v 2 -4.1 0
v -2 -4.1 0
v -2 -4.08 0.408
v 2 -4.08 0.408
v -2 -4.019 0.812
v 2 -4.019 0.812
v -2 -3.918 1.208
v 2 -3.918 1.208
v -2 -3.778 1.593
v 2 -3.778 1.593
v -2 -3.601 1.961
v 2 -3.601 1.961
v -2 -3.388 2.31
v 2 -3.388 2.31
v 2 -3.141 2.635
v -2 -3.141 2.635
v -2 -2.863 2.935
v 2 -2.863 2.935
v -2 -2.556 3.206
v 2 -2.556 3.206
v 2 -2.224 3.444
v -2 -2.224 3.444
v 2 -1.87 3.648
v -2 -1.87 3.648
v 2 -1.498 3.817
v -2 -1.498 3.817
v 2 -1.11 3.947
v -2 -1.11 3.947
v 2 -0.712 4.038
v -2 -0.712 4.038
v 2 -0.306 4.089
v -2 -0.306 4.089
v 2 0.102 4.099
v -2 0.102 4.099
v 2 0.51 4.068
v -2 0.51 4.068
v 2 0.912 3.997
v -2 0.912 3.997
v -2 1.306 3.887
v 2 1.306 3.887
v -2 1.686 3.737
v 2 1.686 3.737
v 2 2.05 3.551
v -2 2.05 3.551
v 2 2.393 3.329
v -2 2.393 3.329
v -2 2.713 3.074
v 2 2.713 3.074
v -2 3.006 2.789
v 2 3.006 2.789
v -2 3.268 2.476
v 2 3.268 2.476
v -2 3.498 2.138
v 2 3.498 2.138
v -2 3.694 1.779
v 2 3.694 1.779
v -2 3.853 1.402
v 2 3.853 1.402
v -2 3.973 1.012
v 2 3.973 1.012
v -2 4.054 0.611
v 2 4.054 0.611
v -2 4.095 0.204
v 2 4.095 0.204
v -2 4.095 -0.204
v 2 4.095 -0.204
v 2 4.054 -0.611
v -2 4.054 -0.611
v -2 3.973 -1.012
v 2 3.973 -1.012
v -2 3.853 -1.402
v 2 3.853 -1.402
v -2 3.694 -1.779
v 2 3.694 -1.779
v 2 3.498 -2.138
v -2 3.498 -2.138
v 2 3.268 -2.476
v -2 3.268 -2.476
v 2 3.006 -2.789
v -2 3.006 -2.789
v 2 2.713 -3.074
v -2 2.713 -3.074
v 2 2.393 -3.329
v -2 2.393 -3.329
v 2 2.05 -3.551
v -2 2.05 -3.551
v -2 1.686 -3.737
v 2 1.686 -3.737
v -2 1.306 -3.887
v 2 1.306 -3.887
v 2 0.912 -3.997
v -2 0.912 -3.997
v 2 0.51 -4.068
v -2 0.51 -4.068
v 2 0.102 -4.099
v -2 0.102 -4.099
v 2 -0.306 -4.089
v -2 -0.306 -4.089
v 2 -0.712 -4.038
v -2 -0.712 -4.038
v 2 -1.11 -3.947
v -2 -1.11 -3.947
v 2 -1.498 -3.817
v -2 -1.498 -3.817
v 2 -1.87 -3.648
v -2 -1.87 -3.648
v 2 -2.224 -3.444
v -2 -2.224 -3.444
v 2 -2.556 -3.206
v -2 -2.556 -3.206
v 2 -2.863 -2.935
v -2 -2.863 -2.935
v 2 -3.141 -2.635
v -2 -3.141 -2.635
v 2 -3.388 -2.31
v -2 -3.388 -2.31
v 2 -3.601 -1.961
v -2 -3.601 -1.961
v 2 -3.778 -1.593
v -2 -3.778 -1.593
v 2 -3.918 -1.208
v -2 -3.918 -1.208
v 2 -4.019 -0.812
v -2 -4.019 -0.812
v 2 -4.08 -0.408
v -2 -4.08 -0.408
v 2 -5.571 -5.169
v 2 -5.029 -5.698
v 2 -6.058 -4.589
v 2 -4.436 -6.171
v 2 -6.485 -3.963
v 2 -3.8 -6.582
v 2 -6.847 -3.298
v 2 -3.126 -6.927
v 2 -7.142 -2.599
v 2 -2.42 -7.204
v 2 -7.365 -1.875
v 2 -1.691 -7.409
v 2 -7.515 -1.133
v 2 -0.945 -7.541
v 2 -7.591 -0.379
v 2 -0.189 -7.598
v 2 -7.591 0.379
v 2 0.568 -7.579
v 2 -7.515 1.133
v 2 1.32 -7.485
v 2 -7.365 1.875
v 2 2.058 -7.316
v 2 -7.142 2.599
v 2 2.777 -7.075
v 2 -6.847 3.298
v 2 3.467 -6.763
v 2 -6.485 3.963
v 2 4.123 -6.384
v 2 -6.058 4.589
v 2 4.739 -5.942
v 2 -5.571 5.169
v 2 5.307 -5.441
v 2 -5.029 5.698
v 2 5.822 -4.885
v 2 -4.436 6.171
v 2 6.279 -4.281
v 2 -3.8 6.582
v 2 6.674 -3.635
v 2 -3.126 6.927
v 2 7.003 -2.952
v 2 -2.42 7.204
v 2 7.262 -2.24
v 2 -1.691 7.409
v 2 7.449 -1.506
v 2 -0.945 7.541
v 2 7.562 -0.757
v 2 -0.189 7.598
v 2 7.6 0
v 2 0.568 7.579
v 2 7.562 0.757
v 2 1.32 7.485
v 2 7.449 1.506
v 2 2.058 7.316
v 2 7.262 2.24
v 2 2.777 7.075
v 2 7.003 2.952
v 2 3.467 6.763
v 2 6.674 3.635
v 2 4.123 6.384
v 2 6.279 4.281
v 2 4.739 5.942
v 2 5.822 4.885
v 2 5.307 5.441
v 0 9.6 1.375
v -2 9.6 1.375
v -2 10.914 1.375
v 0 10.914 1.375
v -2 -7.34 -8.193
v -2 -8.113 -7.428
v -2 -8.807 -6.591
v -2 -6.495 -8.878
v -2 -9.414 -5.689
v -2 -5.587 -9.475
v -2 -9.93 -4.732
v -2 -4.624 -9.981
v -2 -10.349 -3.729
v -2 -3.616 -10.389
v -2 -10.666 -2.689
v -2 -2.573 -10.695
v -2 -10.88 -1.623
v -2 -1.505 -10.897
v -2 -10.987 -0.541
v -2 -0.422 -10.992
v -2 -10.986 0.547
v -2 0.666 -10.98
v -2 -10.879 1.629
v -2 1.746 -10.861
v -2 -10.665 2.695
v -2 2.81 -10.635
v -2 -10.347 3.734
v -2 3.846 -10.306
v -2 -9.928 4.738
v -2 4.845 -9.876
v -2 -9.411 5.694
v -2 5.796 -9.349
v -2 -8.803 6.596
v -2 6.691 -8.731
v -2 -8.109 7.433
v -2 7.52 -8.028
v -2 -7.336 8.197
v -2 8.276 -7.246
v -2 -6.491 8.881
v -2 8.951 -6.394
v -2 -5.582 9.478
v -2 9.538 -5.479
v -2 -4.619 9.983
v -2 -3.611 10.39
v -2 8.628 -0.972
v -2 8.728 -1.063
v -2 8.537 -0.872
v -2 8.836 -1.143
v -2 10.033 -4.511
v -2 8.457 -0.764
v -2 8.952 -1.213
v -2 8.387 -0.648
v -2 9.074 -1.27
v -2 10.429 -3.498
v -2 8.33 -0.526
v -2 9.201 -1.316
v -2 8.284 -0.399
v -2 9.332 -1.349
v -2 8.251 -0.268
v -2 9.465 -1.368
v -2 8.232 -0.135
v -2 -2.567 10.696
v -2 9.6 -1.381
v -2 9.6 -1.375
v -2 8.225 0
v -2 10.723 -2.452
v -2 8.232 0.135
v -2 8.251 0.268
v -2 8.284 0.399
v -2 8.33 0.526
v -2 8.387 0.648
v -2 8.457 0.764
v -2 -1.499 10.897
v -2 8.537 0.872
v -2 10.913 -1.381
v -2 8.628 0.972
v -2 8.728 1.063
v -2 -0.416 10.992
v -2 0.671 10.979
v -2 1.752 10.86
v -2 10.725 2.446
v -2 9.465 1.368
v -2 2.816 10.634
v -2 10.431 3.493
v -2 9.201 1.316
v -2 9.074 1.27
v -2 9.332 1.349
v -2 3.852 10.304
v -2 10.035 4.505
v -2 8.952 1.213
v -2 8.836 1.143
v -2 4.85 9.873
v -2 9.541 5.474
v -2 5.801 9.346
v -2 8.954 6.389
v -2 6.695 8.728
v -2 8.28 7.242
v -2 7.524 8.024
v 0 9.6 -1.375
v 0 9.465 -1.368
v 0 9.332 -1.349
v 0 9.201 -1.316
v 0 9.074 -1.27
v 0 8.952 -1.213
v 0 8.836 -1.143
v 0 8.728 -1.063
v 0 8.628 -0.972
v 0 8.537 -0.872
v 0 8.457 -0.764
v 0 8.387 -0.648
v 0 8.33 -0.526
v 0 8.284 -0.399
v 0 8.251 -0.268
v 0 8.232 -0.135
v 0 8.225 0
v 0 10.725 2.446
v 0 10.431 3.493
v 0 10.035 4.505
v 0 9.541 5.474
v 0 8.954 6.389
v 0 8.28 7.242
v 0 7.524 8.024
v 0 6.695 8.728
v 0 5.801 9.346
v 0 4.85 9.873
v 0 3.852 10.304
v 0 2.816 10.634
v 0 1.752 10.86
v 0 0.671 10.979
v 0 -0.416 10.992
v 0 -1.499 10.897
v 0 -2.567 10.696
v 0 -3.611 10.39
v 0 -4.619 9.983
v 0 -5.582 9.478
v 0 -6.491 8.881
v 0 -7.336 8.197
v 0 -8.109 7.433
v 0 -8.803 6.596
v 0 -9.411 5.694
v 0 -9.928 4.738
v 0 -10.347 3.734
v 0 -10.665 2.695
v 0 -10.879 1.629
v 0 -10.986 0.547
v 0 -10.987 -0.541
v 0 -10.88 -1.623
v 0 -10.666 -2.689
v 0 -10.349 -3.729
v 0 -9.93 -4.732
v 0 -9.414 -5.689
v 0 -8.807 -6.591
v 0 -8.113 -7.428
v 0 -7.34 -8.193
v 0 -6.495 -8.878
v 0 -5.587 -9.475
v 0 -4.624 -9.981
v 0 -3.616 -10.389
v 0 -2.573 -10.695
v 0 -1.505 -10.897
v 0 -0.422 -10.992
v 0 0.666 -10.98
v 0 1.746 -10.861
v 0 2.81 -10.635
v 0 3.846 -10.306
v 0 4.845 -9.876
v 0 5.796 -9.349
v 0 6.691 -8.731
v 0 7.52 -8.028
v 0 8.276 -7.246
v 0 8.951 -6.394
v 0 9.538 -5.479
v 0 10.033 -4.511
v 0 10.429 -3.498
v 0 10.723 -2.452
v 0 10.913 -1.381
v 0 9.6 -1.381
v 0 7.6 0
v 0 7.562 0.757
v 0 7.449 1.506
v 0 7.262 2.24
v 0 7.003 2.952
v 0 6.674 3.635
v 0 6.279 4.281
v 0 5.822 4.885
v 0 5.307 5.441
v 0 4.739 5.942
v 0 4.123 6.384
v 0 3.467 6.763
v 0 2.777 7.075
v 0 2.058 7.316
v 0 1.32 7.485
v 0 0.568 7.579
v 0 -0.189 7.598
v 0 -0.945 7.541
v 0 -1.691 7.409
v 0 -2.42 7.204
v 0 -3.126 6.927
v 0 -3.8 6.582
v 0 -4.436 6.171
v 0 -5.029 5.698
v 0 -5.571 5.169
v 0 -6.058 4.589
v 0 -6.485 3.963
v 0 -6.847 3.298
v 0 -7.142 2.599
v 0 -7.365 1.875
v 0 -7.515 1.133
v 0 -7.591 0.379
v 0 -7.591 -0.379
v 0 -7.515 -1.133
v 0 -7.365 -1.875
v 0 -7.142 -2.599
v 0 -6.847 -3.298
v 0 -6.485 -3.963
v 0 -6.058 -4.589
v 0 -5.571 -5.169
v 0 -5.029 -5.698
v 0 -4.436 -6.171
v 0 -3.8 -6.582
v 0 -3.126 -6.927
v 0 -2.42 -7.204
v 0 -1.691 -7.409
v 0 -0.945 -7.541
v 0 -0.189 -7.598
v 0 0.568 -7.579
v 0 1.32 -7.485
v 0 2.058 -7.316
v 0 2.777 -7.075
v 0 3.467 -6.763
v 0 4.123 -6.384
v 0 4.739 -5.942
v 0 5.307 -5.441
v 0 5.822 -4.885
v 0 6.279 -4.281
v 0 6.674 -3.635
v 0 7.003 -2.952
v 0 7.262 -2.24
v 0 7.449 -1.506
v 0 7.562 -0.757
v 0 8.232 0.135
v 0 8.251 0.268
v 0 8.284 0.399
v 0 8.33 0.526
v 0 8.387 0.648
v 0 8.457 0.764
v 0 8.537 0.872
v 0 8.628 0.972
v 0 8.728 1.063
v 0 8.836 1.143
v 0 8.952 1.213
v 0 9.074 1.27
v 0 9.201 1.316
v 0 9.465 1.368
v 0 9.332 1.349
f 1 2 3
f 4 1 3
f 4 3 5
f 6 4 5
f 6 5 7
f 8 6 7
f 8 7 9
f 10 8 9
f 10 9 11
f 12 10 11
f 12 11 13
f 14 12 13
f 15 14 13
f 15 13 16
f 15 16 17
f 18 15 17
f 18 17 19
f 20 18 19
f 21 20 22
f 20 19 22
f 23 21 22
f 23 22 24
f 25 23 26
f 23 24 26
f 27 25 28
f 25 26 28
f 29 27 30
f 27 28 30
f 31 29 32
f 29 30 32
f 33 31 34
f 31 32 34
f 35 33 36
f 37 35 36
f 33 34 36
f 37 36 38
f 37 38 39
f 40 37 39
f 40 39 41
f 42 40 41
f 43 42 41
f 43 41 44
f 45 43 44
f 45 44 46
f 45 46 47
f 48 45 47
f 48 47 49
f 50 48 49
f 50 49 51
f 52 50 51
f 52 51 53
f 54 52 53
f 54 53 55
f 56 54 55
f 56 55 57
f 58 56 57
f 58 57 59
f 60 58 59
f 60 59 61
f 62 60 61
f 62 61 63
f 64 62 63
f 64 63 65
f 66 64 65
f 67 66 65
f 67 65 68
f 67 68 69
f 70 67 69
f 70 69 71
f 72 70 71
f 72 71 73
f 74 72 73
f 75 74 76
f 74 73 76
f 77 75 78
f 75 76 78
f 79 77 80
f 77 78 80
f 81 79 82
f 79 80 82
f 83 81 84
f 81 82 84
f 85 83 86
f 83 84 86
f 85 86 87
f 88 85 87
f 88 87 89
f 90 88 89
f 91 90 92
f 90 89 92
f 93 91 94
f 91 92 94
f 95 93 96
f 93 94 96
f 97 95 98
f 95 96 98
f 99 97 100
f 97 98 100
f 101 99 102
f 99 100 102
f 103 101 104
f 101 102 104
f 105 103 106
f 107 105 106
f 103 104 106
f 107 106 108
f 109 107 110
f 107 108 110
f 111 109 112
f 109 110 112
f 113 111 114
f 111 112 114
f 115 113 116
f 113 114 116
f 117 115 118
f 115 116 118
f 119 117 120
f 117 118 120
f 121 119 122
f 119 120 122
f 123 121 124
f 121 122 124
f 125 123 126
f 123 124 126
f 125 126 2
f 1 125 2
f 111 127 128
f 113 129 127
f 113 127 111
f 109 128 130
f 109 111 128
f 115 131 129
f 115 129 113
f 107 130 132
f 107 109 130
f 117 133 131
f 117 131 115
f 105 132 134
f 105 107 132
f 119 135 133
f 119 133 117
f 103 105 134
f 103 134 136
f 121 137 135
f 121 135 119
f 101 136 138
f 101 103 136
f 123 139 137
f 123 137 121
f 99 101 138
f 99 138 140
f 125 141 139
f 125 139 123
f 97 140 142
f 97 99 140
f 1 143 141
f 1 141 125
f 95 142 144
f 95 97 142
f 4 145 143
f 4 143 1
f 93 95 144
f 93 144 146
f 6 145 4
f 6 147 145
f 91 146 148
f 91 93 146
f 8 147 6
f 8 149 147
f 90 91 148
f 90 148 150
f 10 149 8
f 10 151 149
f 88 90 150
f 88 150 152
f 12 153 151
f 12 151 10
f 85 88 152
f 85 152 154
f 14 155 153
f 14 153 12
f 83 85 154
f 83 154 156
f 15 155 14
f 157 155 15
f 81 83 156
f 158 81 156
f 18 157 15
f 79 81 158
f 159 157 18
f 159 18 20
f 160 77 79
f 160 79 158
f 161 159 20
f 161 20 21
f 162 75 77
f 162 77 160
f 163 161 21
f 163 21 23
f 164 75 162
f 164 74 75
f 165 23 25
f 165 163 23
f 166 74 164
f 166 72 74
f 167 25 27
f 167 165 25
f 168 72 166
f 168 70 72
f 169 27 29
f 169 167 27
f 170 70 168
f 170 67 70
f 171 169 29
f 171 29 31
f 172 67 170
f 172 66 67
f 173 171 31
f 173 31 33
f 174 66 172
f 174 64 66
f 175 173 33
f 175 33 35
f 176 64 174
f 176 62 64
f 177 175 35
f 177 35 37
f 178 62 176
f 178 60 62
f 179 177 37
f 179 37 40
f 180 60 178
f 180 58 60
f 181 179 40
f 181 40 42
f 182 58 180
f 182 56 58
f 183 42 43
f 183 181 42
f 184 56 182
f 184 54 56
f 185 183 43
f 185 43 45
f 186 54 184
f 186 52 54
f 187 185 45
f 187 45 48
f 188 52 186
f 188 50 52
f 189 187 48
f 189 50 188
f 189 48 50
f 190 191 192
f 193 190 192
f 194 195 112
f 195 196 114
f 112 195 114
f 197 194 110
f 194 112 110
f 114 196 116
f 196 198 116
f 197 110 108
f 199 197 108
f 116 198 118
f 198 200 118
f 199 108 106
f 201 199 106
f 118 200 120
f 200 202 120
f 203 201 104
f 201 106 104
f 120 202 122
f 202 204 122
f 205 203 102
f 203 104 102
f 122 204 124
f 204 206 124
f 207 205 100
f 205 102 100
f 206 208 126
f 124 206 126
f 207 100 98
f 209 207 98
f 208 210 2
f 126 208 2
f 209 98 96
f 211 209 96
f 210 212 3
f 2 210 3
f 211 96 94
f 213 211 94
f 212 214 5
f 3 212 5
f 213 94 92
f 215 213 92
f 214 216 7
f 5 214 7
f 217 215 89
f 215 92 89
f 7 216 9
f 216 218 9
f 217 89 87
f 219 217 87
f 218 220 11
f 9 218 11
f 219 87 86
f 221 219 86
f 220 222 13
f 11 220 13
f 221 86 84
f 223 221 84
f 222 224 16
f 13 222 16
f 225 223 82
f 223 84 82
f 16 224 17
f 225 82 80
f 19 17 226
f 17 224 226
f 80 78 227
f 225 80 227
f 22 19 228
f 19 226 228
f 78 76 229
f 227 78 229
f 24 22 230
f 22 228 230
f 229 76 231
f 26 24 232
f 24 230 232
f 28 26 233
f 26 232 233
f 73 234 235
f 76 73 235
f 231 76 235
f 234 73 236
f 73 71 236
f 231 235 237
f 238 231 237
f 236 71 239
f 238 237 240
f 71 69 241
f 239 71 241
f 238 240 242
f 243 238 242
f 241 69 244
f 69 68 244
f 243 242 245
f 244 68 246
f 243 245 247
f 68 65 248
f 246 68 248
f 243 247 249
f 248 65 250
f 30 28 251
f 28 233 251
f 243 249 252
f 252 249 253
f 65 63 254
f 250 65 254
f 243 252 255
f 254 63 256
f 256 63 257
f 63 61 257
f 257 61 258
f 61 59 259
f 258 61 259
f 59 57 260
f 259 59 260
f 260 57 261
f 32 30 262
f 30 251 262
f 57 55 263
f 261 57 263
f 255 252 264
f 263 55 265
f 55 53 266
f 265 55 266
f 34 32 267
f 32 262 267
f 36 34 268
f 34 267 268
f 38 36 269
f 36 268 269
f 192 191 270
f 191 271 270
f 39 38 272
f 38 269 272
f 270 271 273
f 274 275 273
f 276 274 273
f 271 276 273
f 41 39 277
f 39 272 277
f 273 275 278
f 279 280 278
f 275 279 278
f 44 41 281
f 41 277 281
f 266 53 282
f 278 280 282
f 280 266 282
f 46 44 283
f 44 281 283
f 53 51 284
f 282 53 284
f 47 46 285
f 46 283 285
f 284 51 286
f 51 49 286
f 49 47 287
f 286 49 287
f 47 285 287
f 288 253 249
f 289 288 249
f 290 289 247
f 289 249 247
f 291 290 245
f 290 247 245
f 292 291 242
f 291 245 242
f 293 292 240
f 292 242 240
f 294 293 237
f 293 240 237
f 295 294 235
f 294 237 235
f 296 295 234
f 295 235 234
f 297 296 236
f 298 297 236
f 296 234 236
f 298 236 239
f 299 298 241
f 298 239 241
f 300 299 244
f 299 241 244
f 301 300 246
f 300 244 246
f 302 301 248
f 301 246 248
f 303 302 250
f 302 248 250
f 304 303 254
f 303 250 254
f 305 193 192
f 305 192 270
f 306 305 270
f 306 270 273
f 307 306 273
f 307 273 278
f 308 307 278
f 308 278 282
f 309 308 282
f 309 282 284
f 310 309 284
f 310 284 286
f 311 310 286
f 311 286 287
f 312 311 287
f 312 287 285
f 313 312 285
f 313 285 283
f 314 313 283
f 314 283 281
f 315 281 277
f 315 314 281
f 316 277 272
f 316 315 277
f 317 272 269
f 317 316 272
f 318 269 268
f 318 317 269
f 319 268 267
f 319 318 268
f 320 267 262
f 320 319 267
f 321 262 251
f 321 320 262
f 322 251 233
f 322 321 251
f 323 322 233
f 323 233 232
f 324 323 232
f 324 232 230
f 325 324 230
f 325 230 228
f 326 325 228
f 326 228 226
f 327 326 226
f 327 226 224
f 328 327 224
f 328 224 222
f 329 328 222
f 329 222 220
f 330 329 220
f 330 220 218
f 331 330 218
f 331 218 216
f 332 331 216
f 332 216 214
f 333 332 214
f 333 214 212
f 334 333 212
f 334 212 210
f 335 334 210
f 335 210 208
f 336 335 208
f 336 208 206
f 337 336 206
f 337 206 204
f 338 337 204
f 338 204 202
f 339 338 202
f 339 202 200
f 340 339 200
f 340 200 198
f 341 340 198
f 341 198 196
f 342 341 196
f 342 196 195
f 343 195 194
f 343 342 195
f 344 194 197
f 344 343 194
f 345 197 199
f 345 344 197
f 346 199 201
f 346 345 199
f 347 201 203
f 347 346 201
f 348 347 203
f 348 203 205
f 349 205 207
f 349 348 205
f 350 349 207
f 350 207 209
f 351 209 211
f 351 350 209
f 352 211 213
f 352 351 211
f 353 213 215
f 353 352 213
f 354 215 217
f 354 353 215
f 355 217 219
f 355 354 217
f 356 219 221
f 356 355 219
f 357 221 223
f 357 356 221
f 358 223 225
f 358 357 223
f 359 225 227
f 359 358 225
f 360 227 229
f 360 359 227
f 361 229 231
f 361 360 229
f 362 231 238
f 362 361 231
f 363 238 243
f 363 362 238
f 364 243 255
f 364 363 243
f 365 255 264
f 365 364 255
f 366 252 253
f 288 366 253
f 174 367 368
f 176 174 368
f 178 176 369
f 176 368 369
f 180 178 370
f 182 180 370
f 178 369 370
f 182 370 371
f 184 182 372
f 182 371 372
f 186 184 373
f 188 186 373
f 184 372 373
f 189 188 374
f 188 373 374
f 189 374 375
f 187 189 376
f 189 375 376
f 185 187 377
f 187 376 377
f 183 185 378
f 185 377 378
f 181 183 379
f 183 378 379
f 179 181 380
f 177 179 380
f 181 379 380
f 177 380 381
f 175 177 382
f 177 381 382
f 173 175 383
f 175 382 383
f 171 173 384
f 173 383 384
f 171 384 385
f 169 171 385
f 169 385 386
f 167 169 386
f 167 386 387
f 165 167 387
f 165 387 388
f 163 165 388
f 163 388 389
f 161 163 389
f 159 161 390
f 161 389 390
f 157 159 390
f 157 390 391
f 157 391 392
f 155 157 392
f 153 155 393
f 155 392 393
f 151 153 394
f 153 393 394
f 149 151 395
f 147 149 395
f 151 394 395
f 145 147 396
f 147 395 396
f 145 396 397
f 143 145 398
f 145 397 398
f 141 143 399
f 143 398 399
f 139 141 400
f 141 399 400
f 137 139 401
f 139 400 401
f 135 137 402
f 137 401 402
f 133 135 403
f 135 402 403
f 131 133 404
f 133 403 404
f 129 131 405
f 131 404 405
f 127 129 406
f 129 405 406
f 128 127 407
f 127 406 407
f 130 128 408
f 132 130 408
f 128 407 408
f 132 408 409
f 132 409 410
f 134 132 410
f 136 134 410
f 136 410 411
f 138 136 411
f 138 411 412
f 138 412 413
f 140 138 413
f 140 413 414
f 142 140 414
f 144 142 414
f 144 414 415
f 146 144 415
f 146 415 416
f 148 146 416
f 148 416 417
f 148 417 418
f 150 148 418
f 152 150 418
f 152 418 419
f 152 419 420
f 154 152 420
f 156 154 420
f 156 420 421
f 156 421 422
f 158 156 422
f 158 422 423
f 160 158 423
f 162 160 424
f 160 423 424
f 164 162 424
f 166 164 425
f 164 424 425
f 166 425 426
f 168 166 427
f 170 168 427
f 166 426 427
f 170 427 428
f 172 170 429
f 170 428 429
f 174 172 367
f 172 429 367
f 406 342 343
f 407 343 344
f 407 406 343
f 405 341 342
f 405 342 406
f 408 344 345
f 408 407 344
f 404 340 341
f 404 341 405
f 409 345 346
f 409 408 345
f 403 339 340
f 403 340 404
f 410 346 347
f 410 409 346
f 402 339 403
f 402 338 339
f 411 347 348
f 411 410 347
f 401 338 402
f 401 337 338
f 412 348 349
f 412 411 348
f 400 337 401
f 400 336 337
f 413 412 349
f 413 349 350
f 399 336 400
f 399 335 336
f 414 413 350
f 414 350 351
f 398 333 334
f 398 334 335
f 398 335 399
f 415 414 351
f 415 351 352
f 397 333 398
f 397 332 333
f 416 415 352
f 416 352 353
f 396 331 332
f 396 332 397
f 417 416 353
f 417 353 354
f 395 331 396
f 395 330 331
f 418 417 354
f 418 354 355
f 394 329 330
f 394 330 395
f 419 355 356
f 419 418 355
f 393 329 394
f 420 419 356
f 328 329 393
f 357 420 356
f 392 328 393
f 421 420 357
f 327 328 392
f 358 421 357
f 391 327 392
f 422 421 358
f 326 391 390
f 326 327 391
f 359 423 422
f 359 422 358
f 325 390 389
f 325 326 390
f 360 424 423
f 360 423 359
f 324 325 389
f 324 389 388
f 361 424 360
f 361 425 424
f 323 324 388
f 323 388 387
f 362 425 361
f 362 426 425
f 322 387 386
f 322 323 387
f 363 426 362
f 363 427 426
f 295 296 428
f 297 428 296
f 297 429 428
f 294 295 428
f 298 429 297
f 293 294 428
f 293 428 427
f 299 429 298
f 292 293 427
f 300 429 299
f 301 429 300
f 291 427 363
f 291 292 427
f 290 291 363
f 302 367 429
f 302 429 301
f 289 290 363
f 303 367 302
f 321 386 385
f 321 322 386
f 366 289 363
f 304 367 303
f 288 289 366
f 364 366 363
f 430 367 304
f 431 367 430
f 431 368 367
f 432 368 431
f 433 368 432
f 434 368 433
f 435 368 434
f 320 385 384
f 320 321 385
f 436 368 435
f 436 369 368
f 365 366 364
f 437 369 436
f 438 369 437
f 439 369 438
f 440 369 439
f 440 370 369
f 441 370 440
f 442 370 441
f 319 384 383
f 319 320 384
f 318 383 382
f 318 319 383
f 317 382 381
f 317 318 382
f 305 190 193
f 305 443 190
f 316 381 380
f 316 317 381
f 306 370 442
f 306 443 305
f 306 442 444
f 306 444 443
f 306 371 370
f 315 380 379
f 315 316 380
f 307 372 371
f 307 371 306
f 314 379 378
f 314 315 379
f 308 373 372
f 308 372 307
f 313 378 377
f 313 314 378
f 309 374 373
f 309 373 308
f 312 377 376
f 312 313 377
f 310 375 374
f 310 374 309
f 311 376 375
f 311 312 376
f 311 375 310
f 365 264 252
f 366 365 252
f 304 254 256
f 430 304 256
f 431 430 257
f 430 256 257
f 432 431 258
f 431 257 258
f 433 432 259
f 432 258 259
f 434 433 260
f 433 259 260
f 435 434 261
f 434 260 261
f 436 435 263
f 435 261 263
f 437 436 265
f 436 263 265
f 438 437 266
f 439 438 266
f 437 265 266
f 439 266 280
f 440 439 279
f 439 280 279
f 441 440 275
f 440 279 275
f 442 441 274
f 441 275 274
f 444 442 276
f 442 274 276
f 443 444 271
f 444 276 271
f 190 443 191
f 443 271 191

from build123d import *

# Parameters (mm, degrees)
F0_R     = 11
F0_R_2   = 7.6
F1_DEPTH = 2
F2_DEPTH = 2
F3_R     = 4.1
F4_DEPTH = 25
F6_DEPTH = 5


# Not quite as in the source:
# - a feature names something its author has since deleted; it is built from what else it names


with BuildPart() as f1:
    # F0 (on Right) → F1 (new body)
    with BuildSketch(Plane.YZ):
        Circle(F0_R)
        Circle(F0_R_2, mode=Mode.SUBTRACT)
        Circle(F0_R_2)
    extrude(amount=-F1_DEPTH)

    # F0 (on Right) → F2 (join)
    with BuildSketch(Plane.YZ):
        Circle(F0_R_2)
    extrude(amount=F2_DEPTH)

    # F3 (on face) → F4 (cut)
    with BuildSketch(Plane(origin=(-2, 0, 0), x_dir=(0, -1, 0), z_dir=(-1, 0, 0))):
        Circle(F3_R)
    extrude(amount=-F4_DEPTH, mode=Mode.SUBTRACT)

    # F5 (on face) → F6 (cut)
    with BuildSketch(Plane(origin=(-2, 0, 0), x_dir=(0, -1, 0), z_dir=(-1, 0, 0))):
        with BuildLine():
            ThreePointArc((-10.9129812948, -1.3808835065), (-10.9999996004, -0.0029651094), (-10.9137241581, 1.375))
            Line((-10.9137241581, 1.375), (-11.6283151001, 1.375))
            Line((-11.6283151001, 1.375), (-11.6283151001, -1.3808835065))
            Line((-11.6283151001, -1.3808835065), (-10.9129812948, -1.3808835065))
        make_face()
        with BuildLine():
            Line((-9.6, -1.375), (-9.6, 1.375))
            ThreePointArc((-9.6, 1.375), (-10.975, 0), (-9.6, -1.375))
        make_face()
        with BuildLine():
            ThreePointArc((-9.6, -1.375), (-10.975, 0), (-9.6, 1.375))
            Line((-9.6, 1.375), (-10.9137241581, 1.375))
            ThreePointArc((-10.9137241581, 1.375), (-10.9999996004, -0.0029651094), (-10.9129812948, -1.3808835065))
            Line((-10.9129812948, -1.3808835065), (-9.6, -1.3808835065))
            Line((-9.6, -1.3808835065), (-9.6, -1.375))
        make_face()
        with BuildLine():
            ThreePointArc((-9.6, -1.375), (-8.6277281759, -0.9722718241), (-8.225, 0))
            ThreePointArc((-8.225, 0), (-8.6277281759, 0.9722718241), (-9.6, 1.375))
            Line((-9.6, 1.375), (-9.6, -1.375))
        make_face()
    extrude(amount=-F6_DEPTH, mode=Mode.SUBTRACT)


solid = f1.part
